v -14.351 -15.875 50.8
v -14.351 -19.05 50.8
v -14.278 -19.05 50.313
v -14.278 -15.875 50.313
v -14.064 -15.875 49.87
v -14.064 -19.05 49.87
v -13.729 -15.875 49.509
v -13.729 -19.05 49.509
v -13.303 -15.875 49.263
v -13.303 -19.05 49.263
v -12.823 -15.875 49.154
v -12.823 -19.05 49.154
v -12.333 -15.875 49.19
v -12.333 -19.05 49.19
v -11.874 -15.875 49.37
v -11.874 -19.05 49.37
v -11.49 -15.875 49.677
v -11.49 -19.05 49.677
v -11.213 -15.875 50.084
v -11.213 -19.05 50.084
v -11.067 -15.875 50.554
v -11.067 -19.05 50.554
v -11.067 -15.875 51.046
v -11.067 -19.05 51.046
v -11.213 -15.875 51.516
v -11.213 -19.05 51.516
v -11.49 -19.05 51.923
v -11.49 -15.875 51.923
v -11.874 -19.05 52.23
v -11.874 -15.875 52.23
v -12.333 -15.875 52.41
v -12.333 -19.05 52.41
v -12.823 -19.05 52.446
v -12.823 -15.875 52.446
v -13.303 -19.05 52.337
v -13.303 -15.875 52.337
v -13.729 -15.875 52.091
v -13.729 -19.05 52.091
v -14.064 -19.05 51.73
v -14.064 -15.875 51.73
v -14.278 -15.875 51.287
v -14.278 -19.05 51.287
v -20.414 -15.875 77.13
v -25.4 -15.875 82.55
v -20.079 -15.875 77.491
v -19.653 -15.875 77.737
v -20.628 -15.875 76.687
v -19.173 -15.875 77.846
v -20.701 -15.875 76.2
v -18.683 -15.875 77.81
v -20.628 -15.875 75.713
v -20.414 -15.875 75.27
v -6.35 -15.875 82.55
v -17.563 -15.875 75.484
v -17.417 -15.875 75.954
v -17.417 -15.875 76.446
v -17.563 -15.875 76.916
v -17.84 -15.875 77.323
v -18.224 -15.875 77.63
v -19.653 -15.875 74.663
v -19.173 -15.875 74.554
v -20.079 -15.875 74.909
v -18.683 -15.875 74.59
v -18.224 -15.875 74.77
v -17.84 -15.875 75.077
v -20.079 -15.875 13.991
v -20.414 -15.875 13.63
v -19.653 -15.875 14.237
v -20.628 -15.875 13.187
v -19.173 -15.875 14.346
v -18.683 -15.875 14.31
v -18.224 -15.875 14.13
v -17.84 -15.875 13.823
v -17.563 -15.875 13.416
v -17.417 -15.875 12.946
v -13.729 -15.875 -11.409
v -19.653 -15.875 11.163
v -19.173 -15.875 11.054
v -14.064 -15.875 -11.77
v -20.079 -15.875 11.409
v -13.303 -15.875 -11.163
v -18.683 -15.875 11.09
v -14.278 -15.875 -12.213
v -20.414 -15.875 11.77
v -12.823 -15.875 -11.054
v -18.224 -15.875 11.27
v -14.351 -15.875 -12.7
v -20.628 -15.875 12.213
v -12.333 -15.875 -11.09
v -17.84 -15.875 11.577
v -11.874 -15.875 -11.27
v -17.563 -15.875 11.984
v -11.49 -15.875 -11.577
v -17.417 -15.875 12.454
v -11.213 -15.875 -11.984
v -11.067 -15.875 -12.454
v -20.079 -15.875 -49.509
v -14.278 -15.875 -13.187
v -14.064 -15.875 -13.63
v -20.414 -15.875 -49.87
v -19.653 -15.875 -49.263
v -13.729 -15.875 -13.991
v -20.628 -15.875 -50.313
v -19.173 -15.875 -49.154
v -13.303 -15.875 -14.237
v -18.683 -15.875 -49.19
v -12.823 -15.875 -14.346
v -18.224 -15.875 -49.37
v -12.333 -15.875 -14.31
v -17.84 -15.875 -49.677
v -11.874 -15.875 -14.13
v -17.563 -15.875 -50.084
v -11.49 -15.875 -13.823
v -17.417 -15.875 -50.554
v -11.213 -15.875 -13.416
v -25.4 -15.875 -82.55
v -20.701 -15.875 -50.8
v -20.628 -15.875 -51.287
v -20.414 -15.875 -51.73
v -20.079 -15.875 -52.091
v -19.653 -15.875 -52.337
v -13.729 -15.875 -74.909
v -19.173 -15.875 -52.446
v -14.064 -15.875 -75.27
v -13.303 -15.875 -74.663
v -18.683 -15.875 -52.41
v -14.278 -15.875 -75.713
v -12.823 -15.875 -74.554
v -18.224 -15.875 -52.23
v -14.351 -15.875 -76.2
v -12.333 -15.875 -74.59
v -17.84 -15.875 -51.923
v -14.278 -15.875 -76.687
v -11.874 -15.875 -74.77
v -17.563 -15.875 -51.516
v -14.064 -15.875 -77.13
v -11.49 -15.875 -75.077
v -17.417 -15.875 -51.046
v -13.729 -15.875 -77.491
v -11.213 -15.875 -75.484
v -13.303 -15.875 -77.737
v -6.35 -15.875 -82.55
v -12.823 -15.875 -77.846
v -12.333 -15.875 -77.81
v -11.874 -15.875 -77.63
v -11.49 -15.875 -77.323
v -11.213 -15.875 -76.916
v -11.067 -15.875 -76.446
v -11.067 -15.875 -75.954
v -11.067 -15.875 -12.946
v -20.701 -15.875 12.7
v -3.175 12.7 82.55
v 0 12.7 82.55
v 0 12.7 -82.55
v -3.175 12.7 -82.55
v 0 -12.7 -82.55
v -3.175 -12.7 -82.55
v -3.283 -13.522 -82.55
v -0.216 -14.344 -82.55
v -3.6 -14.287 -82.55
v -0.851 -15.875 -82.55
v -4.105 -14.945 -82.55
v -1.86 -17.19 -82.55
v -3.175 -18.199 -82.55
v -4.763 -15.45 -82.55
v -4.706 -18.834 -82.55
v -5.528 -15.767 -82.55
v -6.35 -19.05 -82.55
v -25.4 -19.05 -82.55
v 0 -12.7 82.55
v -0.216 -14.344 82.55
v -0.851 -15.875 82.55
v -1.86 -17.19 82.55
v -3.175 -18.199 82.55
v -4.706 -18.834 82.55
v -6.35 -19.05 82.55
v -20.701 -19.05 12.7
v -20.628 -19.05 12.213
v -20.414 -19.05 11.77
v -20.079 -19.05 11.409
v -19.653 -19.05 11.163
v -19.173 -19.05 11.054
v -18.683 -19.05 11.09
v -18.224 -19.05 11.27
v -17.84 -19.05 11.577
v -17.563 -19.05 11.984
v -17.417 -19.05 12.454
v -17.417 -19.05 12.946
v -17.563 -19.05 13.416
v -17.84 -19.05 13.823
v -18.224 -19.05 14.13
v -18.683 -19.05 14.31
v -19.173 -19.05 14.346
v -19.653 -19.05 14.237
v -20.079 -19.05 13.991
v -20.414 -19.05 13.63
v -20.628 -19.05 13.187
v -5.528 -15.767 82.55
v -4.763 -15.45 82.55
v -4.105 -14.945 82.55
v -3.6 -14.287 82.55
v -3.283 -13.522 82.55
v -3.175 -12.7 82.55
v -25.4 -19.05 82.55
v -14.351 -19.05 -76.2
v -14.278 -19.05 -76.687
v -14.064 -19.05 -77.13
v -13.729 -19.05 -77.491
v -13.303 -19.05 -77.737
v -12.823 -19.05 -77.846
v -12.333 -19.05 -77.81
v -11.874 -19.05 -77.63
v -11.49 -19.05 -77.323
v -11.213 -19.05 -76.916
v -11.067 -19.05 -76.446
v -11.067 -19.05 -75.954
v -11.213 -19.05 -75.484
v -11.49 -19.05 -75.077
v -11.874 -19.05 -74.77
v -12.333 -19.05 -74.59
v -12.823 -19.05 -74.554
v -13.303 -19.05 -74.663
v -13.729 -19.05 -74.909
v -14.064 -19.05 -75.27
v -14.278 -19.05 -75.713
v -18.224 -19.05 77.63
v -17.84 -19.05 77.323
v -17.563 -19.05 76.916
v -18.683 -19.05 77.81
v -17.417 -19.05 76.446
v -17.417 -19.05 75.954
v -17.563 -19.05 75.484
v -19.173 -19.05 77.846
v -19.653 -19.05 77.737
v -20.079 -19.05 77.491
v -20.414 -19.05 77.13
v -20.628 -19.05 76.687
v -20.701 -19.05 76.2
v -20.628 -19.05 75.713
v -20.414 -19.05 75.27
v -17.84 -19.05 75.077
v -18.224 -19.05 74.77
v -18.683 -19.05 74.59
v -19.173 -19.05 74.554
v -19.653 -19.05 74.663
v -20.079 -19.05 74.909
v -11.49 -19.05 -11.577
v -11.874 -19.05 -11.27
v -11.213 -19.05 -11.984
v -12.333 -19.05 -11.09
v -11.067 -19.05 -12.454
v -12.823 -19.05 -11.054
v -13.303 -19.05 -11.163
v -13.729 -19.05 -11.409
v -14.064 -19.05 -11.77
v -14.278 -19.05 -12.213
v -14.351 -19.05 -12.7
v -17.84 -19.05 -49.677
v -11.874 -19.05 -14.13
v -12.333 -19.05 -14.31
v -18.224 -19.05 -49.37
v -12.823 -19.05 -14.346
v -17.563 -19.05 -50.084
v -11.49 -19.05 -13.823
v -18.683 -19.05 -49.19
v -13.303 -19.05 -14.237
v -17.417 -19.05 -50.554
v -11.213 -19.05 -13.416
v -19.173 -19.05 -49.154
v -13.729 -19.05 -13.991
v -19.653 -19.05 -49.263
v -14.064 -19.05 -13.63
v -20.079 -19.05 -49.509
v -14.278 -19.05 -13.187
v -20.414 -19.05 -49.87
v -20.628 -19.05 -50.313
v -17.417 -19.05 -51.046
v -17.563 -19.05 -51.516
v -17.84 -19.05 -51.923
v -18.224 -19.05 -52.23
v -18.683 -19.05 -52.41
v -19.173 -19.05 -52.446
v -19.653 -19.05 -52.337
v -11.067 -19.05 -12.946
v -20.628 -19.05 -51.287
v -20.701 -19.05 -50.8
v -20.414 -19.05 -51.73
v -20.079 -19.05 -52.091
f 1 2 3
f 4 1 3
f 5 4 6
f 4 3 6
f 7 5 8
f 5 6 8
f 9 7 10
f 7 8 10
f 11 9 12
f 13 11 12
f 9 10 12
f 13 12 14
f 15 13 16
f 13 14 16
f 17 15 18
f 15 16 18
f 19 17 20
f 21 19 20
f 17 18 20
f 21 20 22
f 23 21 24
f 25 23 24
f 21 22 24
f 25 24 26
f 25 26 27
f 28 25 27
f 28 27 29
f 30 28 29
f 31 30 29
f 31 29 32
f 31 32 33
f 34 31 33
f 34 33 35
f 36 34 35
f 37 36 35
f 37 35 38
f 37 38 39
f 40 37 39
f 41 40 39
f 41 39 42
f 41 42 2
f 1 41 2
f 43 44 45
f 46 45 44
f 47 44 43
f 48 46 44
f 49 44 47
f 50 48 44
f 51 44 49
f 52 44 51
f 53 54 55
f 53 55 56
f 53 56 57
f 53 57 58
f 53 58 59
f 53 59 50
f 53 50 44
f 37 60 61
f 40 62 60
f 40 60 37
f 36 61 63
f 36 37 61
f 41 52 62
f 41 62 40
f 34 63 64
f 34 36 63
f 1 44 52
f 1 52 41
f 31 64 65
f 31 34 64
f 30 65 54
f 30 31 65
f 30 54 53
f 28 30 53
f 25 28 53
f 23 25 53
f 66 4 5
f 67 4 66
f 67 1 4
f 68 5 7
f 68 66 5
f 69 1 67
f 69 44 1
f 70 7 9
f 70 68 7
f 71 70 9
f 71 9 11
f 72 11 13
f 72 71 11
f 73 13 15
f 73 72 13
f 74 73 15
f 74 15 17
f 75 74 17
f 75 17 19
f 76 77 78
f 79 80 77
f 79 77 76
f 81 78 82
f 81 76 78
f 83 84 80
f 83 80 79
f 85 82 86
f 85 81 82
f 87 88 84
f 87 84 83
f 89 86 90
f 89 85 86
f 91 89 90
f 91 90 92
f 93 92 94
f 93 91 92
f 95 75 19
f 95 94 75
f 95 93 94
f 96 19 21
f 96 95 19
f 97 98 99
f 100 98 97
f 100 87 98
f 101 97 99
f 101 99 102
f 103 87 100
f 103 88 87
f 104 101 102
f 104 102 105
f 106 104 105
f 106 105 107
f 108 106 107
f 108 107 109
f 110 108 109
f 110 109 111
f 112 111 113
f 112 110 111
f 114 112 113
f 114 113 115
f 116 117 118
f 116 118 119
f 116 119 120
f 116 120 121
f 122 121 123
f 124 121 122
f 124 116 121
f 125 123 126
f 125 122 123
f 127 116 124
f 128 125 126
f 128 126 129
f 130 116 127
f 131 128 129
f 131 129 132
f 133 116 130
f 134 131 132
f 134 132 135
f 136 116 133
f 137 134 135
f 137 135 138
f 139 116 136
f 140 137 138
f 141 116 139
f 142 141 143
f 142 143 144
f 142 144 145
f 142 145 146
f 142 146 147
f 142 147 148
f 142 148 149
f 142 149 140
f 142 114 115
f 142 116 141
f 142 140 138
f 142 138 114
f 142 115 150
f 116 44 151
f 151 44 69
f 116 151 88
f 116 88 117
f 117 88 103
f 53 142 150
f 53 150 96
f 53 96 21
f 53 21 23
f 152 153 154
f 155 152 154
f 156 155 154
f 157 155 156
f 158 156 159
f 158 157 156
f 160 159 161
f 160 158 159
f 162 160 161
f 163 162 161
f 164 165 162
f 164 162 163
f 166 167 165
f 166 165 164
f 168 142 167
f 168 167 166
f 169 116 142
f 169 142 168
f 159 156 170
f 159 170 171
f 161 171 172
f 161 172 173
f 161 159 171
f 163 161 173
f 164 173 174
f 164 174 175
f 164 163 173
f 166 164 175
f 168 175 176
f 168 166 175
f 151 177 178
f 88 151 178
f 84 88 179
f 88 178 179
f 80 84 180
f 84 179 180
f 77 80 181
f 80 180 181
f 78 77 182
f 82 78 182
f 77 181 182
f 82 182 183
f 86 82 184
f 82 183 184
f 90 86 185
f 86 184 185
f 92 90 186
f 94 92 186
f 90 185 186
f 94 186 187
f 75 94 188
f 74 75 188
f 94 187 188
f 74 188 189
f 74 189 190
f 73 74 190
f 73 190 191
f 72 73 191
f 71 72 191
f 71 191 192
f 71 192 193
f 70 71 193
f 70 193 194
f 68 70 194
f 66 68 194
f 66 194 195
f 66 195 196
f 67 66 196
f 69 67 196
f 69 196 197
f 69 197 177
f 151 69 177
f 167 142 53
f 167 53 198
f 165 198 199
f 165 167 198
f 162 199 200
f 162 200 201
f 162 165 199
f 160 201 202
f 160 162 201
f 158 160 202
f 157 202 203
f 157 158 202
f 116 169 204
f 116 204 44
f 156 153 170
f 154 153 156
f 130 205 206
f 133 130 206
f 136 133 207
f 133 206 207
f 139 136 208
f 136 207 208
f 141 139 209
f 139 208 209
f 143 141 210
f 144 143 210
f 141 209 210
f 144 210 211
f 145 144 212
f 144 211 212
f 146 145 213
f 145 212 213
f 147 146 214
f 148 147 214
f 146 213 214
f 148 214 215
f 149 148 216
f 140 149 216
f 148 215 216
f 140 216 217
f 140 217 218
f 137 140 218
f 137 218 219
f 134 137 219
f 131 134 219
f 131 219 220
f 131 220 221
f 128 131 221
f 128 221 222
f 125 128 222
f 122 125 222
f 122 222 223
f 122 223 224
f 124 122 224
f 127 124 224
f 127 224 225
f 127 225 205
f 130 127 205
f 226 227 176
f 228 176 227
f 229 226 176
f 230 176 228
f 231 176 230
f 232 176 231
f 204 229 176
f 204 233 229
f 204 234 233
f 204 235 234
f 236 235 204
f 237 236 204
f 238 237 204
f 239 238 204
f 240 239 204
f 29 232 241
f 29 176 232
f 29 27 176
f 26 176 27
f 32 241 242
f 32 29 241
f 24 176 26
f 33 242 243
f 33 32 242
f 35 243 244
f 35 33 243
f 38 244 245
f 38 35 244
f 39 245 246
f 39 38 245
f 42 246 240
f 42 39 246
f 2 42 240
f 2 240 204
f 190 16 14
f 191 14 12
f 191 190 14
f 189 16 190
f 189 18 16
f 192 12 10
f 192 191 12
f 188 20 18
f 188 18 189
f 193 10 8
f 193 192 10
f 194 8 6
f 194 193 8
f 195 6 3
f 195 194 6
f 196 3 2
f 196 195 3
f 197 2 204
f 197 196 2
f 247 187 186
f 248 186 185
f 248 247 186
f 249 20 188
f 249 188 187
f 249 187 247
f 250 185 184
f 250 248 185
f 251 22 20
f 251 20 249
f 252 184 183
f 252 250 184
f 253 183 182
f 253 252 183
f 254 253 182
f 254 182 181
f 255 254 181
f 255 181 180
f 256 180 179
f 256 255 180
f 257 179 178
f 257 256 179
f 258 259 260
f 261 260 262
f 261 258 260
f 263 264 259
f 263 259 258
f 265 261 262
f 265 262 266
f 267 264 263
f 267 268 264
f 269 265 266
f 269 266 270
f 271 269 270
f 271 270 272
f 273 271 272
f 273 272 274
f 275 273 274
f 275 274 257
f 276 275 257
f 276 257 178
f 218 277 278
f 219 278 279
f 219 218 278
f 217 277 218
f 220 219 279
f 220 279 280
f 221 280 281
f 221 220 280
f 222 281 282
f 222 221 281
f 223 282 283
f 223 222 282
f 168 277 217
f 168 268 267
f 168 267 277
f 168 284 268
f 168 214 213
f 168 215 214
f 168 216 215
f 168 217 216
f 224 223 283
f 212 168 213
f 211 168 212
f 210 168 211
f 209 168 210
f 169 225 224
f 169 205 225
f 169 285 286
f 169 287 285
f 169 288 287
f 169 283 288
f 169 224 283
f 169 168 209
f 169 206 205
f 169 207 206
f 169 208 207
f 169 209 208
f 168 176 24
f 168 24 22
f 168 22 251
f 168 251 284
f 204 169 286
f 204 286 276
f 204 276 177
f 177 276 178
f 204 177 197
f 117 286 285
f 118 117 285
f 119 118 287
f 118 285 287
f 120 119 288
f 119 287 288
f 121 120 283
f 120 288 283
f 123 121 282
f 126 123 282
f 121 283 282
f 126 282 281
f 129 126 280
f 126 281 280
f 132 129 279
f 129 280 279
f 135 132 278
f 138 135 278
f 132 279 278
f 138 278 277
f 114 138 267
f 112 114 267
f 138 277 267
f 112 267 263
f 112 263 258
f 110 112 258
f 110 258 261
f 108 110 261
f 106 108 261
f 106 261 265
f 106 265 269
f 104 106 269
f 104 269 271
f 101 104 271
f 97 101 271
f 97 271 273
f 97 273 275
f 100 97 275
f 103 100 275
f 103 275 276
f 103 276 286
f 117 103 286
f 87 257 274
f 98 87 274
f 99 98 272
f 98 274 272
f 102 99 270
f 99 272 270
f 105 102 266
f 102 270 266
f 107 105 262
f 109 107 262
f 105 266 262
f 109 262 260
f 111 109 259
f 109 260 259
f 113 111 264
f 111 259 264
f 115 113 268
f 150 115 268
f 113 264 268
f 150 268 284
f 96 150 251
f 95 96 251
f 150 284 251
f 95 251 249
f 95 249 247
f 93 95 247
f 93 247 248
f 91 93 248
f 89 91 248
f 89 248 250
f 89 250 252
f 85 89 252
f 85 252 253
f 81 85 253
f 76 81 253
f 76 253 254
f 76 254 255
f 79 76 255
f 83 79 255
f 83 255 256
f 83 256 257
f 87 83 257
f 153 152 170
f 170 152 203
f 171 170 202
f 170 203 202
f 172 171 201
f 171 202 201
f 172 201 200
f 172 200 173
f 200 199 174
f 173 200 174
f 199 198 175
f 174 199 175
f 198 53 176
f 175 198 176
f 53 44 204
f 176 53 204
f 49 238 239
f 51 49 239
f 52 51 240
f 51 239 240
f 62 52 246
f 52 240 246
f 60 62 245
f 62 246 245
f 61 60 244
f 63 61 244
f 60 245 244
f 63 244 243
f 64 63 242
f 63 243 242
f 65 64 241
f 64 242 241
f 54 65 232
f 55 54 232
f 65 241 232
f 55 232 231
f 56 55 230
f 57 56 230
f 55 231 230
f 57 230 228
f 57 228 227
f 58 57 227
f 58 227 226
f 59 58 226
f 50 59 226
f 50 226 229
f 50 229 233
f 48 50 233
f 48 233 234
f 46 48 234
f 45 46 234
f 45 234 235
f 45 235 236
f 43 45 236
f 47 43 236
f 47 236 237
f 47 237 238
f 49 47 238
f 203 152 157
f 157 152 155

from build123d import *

# Parameters (mm, degrees)
SKETCH2_W                   = 165.1
SKETCH2_H                   = 25.4
BASE_FLANGE1_DEPTH          = 3.175
EDGE_FLANGE1_DEPTH          = 165.1
F_1_8_0_13_DIAMETER_HOLE1_D = 3.302


# Sheet-metal steps are written as plain solids
with BuildPart() as part:
    # Sketch2 → Base-Flange1 (new body)
    with BuildSketch(Plane(origin=(0, 0, 0), x_dir=(0, 0, -1), z_dir=(1, 0, 0))):
        Rectangle(SKETCH2_W, SKETCH2_H)
    extrude(amount=-BASE_FLANGE1_DEPTH)

    # Edge-Flange1 section (across the edge) → Edge-Flange1 (add)
    with BuildSketch(Plane(origin=(-3.175, -15.875, -82.55), x_dir=(0, 1, 0), z_dir=(0, 0, 1))):
        with BuildLine():
            Line((-3.175, 3.175), (-3.175, 22.225))
            Line((-3.175, 22.225), (0, 22.225))
            Line((0, 22.225), (0, 3.175))
            ThreePointArc((0, 3.175), (0.92993597, 0.92993597), (3.175, 0))
            Line((3.175, 0), (3.175, -3.175))
            ThreePointArc((3.175, -3.175), (-1.315128061, -1.315128061), (-3.175, 3.175))
        make_face()
    extrude(amount=EDGE_FLANGE1_DEPTH)

    # 1/8 (0.13) Diameter Hole1 (through all)
    with Locations(Plane(origin=(0, -15.875, 0), x_dir=(1, 0, 0), z_dir=(0, 1, 0))):
        with Locations((-12.7, 76.2), (-19.05, 50.8), (-12.7, 12.7), (-19.05, -12.7), (-12.7, -50.8), (-19.05, -76.2)):
            Hole(F_1_8_0_13_DIAMETER_HOLE1_D / 2)


solid = part.part
